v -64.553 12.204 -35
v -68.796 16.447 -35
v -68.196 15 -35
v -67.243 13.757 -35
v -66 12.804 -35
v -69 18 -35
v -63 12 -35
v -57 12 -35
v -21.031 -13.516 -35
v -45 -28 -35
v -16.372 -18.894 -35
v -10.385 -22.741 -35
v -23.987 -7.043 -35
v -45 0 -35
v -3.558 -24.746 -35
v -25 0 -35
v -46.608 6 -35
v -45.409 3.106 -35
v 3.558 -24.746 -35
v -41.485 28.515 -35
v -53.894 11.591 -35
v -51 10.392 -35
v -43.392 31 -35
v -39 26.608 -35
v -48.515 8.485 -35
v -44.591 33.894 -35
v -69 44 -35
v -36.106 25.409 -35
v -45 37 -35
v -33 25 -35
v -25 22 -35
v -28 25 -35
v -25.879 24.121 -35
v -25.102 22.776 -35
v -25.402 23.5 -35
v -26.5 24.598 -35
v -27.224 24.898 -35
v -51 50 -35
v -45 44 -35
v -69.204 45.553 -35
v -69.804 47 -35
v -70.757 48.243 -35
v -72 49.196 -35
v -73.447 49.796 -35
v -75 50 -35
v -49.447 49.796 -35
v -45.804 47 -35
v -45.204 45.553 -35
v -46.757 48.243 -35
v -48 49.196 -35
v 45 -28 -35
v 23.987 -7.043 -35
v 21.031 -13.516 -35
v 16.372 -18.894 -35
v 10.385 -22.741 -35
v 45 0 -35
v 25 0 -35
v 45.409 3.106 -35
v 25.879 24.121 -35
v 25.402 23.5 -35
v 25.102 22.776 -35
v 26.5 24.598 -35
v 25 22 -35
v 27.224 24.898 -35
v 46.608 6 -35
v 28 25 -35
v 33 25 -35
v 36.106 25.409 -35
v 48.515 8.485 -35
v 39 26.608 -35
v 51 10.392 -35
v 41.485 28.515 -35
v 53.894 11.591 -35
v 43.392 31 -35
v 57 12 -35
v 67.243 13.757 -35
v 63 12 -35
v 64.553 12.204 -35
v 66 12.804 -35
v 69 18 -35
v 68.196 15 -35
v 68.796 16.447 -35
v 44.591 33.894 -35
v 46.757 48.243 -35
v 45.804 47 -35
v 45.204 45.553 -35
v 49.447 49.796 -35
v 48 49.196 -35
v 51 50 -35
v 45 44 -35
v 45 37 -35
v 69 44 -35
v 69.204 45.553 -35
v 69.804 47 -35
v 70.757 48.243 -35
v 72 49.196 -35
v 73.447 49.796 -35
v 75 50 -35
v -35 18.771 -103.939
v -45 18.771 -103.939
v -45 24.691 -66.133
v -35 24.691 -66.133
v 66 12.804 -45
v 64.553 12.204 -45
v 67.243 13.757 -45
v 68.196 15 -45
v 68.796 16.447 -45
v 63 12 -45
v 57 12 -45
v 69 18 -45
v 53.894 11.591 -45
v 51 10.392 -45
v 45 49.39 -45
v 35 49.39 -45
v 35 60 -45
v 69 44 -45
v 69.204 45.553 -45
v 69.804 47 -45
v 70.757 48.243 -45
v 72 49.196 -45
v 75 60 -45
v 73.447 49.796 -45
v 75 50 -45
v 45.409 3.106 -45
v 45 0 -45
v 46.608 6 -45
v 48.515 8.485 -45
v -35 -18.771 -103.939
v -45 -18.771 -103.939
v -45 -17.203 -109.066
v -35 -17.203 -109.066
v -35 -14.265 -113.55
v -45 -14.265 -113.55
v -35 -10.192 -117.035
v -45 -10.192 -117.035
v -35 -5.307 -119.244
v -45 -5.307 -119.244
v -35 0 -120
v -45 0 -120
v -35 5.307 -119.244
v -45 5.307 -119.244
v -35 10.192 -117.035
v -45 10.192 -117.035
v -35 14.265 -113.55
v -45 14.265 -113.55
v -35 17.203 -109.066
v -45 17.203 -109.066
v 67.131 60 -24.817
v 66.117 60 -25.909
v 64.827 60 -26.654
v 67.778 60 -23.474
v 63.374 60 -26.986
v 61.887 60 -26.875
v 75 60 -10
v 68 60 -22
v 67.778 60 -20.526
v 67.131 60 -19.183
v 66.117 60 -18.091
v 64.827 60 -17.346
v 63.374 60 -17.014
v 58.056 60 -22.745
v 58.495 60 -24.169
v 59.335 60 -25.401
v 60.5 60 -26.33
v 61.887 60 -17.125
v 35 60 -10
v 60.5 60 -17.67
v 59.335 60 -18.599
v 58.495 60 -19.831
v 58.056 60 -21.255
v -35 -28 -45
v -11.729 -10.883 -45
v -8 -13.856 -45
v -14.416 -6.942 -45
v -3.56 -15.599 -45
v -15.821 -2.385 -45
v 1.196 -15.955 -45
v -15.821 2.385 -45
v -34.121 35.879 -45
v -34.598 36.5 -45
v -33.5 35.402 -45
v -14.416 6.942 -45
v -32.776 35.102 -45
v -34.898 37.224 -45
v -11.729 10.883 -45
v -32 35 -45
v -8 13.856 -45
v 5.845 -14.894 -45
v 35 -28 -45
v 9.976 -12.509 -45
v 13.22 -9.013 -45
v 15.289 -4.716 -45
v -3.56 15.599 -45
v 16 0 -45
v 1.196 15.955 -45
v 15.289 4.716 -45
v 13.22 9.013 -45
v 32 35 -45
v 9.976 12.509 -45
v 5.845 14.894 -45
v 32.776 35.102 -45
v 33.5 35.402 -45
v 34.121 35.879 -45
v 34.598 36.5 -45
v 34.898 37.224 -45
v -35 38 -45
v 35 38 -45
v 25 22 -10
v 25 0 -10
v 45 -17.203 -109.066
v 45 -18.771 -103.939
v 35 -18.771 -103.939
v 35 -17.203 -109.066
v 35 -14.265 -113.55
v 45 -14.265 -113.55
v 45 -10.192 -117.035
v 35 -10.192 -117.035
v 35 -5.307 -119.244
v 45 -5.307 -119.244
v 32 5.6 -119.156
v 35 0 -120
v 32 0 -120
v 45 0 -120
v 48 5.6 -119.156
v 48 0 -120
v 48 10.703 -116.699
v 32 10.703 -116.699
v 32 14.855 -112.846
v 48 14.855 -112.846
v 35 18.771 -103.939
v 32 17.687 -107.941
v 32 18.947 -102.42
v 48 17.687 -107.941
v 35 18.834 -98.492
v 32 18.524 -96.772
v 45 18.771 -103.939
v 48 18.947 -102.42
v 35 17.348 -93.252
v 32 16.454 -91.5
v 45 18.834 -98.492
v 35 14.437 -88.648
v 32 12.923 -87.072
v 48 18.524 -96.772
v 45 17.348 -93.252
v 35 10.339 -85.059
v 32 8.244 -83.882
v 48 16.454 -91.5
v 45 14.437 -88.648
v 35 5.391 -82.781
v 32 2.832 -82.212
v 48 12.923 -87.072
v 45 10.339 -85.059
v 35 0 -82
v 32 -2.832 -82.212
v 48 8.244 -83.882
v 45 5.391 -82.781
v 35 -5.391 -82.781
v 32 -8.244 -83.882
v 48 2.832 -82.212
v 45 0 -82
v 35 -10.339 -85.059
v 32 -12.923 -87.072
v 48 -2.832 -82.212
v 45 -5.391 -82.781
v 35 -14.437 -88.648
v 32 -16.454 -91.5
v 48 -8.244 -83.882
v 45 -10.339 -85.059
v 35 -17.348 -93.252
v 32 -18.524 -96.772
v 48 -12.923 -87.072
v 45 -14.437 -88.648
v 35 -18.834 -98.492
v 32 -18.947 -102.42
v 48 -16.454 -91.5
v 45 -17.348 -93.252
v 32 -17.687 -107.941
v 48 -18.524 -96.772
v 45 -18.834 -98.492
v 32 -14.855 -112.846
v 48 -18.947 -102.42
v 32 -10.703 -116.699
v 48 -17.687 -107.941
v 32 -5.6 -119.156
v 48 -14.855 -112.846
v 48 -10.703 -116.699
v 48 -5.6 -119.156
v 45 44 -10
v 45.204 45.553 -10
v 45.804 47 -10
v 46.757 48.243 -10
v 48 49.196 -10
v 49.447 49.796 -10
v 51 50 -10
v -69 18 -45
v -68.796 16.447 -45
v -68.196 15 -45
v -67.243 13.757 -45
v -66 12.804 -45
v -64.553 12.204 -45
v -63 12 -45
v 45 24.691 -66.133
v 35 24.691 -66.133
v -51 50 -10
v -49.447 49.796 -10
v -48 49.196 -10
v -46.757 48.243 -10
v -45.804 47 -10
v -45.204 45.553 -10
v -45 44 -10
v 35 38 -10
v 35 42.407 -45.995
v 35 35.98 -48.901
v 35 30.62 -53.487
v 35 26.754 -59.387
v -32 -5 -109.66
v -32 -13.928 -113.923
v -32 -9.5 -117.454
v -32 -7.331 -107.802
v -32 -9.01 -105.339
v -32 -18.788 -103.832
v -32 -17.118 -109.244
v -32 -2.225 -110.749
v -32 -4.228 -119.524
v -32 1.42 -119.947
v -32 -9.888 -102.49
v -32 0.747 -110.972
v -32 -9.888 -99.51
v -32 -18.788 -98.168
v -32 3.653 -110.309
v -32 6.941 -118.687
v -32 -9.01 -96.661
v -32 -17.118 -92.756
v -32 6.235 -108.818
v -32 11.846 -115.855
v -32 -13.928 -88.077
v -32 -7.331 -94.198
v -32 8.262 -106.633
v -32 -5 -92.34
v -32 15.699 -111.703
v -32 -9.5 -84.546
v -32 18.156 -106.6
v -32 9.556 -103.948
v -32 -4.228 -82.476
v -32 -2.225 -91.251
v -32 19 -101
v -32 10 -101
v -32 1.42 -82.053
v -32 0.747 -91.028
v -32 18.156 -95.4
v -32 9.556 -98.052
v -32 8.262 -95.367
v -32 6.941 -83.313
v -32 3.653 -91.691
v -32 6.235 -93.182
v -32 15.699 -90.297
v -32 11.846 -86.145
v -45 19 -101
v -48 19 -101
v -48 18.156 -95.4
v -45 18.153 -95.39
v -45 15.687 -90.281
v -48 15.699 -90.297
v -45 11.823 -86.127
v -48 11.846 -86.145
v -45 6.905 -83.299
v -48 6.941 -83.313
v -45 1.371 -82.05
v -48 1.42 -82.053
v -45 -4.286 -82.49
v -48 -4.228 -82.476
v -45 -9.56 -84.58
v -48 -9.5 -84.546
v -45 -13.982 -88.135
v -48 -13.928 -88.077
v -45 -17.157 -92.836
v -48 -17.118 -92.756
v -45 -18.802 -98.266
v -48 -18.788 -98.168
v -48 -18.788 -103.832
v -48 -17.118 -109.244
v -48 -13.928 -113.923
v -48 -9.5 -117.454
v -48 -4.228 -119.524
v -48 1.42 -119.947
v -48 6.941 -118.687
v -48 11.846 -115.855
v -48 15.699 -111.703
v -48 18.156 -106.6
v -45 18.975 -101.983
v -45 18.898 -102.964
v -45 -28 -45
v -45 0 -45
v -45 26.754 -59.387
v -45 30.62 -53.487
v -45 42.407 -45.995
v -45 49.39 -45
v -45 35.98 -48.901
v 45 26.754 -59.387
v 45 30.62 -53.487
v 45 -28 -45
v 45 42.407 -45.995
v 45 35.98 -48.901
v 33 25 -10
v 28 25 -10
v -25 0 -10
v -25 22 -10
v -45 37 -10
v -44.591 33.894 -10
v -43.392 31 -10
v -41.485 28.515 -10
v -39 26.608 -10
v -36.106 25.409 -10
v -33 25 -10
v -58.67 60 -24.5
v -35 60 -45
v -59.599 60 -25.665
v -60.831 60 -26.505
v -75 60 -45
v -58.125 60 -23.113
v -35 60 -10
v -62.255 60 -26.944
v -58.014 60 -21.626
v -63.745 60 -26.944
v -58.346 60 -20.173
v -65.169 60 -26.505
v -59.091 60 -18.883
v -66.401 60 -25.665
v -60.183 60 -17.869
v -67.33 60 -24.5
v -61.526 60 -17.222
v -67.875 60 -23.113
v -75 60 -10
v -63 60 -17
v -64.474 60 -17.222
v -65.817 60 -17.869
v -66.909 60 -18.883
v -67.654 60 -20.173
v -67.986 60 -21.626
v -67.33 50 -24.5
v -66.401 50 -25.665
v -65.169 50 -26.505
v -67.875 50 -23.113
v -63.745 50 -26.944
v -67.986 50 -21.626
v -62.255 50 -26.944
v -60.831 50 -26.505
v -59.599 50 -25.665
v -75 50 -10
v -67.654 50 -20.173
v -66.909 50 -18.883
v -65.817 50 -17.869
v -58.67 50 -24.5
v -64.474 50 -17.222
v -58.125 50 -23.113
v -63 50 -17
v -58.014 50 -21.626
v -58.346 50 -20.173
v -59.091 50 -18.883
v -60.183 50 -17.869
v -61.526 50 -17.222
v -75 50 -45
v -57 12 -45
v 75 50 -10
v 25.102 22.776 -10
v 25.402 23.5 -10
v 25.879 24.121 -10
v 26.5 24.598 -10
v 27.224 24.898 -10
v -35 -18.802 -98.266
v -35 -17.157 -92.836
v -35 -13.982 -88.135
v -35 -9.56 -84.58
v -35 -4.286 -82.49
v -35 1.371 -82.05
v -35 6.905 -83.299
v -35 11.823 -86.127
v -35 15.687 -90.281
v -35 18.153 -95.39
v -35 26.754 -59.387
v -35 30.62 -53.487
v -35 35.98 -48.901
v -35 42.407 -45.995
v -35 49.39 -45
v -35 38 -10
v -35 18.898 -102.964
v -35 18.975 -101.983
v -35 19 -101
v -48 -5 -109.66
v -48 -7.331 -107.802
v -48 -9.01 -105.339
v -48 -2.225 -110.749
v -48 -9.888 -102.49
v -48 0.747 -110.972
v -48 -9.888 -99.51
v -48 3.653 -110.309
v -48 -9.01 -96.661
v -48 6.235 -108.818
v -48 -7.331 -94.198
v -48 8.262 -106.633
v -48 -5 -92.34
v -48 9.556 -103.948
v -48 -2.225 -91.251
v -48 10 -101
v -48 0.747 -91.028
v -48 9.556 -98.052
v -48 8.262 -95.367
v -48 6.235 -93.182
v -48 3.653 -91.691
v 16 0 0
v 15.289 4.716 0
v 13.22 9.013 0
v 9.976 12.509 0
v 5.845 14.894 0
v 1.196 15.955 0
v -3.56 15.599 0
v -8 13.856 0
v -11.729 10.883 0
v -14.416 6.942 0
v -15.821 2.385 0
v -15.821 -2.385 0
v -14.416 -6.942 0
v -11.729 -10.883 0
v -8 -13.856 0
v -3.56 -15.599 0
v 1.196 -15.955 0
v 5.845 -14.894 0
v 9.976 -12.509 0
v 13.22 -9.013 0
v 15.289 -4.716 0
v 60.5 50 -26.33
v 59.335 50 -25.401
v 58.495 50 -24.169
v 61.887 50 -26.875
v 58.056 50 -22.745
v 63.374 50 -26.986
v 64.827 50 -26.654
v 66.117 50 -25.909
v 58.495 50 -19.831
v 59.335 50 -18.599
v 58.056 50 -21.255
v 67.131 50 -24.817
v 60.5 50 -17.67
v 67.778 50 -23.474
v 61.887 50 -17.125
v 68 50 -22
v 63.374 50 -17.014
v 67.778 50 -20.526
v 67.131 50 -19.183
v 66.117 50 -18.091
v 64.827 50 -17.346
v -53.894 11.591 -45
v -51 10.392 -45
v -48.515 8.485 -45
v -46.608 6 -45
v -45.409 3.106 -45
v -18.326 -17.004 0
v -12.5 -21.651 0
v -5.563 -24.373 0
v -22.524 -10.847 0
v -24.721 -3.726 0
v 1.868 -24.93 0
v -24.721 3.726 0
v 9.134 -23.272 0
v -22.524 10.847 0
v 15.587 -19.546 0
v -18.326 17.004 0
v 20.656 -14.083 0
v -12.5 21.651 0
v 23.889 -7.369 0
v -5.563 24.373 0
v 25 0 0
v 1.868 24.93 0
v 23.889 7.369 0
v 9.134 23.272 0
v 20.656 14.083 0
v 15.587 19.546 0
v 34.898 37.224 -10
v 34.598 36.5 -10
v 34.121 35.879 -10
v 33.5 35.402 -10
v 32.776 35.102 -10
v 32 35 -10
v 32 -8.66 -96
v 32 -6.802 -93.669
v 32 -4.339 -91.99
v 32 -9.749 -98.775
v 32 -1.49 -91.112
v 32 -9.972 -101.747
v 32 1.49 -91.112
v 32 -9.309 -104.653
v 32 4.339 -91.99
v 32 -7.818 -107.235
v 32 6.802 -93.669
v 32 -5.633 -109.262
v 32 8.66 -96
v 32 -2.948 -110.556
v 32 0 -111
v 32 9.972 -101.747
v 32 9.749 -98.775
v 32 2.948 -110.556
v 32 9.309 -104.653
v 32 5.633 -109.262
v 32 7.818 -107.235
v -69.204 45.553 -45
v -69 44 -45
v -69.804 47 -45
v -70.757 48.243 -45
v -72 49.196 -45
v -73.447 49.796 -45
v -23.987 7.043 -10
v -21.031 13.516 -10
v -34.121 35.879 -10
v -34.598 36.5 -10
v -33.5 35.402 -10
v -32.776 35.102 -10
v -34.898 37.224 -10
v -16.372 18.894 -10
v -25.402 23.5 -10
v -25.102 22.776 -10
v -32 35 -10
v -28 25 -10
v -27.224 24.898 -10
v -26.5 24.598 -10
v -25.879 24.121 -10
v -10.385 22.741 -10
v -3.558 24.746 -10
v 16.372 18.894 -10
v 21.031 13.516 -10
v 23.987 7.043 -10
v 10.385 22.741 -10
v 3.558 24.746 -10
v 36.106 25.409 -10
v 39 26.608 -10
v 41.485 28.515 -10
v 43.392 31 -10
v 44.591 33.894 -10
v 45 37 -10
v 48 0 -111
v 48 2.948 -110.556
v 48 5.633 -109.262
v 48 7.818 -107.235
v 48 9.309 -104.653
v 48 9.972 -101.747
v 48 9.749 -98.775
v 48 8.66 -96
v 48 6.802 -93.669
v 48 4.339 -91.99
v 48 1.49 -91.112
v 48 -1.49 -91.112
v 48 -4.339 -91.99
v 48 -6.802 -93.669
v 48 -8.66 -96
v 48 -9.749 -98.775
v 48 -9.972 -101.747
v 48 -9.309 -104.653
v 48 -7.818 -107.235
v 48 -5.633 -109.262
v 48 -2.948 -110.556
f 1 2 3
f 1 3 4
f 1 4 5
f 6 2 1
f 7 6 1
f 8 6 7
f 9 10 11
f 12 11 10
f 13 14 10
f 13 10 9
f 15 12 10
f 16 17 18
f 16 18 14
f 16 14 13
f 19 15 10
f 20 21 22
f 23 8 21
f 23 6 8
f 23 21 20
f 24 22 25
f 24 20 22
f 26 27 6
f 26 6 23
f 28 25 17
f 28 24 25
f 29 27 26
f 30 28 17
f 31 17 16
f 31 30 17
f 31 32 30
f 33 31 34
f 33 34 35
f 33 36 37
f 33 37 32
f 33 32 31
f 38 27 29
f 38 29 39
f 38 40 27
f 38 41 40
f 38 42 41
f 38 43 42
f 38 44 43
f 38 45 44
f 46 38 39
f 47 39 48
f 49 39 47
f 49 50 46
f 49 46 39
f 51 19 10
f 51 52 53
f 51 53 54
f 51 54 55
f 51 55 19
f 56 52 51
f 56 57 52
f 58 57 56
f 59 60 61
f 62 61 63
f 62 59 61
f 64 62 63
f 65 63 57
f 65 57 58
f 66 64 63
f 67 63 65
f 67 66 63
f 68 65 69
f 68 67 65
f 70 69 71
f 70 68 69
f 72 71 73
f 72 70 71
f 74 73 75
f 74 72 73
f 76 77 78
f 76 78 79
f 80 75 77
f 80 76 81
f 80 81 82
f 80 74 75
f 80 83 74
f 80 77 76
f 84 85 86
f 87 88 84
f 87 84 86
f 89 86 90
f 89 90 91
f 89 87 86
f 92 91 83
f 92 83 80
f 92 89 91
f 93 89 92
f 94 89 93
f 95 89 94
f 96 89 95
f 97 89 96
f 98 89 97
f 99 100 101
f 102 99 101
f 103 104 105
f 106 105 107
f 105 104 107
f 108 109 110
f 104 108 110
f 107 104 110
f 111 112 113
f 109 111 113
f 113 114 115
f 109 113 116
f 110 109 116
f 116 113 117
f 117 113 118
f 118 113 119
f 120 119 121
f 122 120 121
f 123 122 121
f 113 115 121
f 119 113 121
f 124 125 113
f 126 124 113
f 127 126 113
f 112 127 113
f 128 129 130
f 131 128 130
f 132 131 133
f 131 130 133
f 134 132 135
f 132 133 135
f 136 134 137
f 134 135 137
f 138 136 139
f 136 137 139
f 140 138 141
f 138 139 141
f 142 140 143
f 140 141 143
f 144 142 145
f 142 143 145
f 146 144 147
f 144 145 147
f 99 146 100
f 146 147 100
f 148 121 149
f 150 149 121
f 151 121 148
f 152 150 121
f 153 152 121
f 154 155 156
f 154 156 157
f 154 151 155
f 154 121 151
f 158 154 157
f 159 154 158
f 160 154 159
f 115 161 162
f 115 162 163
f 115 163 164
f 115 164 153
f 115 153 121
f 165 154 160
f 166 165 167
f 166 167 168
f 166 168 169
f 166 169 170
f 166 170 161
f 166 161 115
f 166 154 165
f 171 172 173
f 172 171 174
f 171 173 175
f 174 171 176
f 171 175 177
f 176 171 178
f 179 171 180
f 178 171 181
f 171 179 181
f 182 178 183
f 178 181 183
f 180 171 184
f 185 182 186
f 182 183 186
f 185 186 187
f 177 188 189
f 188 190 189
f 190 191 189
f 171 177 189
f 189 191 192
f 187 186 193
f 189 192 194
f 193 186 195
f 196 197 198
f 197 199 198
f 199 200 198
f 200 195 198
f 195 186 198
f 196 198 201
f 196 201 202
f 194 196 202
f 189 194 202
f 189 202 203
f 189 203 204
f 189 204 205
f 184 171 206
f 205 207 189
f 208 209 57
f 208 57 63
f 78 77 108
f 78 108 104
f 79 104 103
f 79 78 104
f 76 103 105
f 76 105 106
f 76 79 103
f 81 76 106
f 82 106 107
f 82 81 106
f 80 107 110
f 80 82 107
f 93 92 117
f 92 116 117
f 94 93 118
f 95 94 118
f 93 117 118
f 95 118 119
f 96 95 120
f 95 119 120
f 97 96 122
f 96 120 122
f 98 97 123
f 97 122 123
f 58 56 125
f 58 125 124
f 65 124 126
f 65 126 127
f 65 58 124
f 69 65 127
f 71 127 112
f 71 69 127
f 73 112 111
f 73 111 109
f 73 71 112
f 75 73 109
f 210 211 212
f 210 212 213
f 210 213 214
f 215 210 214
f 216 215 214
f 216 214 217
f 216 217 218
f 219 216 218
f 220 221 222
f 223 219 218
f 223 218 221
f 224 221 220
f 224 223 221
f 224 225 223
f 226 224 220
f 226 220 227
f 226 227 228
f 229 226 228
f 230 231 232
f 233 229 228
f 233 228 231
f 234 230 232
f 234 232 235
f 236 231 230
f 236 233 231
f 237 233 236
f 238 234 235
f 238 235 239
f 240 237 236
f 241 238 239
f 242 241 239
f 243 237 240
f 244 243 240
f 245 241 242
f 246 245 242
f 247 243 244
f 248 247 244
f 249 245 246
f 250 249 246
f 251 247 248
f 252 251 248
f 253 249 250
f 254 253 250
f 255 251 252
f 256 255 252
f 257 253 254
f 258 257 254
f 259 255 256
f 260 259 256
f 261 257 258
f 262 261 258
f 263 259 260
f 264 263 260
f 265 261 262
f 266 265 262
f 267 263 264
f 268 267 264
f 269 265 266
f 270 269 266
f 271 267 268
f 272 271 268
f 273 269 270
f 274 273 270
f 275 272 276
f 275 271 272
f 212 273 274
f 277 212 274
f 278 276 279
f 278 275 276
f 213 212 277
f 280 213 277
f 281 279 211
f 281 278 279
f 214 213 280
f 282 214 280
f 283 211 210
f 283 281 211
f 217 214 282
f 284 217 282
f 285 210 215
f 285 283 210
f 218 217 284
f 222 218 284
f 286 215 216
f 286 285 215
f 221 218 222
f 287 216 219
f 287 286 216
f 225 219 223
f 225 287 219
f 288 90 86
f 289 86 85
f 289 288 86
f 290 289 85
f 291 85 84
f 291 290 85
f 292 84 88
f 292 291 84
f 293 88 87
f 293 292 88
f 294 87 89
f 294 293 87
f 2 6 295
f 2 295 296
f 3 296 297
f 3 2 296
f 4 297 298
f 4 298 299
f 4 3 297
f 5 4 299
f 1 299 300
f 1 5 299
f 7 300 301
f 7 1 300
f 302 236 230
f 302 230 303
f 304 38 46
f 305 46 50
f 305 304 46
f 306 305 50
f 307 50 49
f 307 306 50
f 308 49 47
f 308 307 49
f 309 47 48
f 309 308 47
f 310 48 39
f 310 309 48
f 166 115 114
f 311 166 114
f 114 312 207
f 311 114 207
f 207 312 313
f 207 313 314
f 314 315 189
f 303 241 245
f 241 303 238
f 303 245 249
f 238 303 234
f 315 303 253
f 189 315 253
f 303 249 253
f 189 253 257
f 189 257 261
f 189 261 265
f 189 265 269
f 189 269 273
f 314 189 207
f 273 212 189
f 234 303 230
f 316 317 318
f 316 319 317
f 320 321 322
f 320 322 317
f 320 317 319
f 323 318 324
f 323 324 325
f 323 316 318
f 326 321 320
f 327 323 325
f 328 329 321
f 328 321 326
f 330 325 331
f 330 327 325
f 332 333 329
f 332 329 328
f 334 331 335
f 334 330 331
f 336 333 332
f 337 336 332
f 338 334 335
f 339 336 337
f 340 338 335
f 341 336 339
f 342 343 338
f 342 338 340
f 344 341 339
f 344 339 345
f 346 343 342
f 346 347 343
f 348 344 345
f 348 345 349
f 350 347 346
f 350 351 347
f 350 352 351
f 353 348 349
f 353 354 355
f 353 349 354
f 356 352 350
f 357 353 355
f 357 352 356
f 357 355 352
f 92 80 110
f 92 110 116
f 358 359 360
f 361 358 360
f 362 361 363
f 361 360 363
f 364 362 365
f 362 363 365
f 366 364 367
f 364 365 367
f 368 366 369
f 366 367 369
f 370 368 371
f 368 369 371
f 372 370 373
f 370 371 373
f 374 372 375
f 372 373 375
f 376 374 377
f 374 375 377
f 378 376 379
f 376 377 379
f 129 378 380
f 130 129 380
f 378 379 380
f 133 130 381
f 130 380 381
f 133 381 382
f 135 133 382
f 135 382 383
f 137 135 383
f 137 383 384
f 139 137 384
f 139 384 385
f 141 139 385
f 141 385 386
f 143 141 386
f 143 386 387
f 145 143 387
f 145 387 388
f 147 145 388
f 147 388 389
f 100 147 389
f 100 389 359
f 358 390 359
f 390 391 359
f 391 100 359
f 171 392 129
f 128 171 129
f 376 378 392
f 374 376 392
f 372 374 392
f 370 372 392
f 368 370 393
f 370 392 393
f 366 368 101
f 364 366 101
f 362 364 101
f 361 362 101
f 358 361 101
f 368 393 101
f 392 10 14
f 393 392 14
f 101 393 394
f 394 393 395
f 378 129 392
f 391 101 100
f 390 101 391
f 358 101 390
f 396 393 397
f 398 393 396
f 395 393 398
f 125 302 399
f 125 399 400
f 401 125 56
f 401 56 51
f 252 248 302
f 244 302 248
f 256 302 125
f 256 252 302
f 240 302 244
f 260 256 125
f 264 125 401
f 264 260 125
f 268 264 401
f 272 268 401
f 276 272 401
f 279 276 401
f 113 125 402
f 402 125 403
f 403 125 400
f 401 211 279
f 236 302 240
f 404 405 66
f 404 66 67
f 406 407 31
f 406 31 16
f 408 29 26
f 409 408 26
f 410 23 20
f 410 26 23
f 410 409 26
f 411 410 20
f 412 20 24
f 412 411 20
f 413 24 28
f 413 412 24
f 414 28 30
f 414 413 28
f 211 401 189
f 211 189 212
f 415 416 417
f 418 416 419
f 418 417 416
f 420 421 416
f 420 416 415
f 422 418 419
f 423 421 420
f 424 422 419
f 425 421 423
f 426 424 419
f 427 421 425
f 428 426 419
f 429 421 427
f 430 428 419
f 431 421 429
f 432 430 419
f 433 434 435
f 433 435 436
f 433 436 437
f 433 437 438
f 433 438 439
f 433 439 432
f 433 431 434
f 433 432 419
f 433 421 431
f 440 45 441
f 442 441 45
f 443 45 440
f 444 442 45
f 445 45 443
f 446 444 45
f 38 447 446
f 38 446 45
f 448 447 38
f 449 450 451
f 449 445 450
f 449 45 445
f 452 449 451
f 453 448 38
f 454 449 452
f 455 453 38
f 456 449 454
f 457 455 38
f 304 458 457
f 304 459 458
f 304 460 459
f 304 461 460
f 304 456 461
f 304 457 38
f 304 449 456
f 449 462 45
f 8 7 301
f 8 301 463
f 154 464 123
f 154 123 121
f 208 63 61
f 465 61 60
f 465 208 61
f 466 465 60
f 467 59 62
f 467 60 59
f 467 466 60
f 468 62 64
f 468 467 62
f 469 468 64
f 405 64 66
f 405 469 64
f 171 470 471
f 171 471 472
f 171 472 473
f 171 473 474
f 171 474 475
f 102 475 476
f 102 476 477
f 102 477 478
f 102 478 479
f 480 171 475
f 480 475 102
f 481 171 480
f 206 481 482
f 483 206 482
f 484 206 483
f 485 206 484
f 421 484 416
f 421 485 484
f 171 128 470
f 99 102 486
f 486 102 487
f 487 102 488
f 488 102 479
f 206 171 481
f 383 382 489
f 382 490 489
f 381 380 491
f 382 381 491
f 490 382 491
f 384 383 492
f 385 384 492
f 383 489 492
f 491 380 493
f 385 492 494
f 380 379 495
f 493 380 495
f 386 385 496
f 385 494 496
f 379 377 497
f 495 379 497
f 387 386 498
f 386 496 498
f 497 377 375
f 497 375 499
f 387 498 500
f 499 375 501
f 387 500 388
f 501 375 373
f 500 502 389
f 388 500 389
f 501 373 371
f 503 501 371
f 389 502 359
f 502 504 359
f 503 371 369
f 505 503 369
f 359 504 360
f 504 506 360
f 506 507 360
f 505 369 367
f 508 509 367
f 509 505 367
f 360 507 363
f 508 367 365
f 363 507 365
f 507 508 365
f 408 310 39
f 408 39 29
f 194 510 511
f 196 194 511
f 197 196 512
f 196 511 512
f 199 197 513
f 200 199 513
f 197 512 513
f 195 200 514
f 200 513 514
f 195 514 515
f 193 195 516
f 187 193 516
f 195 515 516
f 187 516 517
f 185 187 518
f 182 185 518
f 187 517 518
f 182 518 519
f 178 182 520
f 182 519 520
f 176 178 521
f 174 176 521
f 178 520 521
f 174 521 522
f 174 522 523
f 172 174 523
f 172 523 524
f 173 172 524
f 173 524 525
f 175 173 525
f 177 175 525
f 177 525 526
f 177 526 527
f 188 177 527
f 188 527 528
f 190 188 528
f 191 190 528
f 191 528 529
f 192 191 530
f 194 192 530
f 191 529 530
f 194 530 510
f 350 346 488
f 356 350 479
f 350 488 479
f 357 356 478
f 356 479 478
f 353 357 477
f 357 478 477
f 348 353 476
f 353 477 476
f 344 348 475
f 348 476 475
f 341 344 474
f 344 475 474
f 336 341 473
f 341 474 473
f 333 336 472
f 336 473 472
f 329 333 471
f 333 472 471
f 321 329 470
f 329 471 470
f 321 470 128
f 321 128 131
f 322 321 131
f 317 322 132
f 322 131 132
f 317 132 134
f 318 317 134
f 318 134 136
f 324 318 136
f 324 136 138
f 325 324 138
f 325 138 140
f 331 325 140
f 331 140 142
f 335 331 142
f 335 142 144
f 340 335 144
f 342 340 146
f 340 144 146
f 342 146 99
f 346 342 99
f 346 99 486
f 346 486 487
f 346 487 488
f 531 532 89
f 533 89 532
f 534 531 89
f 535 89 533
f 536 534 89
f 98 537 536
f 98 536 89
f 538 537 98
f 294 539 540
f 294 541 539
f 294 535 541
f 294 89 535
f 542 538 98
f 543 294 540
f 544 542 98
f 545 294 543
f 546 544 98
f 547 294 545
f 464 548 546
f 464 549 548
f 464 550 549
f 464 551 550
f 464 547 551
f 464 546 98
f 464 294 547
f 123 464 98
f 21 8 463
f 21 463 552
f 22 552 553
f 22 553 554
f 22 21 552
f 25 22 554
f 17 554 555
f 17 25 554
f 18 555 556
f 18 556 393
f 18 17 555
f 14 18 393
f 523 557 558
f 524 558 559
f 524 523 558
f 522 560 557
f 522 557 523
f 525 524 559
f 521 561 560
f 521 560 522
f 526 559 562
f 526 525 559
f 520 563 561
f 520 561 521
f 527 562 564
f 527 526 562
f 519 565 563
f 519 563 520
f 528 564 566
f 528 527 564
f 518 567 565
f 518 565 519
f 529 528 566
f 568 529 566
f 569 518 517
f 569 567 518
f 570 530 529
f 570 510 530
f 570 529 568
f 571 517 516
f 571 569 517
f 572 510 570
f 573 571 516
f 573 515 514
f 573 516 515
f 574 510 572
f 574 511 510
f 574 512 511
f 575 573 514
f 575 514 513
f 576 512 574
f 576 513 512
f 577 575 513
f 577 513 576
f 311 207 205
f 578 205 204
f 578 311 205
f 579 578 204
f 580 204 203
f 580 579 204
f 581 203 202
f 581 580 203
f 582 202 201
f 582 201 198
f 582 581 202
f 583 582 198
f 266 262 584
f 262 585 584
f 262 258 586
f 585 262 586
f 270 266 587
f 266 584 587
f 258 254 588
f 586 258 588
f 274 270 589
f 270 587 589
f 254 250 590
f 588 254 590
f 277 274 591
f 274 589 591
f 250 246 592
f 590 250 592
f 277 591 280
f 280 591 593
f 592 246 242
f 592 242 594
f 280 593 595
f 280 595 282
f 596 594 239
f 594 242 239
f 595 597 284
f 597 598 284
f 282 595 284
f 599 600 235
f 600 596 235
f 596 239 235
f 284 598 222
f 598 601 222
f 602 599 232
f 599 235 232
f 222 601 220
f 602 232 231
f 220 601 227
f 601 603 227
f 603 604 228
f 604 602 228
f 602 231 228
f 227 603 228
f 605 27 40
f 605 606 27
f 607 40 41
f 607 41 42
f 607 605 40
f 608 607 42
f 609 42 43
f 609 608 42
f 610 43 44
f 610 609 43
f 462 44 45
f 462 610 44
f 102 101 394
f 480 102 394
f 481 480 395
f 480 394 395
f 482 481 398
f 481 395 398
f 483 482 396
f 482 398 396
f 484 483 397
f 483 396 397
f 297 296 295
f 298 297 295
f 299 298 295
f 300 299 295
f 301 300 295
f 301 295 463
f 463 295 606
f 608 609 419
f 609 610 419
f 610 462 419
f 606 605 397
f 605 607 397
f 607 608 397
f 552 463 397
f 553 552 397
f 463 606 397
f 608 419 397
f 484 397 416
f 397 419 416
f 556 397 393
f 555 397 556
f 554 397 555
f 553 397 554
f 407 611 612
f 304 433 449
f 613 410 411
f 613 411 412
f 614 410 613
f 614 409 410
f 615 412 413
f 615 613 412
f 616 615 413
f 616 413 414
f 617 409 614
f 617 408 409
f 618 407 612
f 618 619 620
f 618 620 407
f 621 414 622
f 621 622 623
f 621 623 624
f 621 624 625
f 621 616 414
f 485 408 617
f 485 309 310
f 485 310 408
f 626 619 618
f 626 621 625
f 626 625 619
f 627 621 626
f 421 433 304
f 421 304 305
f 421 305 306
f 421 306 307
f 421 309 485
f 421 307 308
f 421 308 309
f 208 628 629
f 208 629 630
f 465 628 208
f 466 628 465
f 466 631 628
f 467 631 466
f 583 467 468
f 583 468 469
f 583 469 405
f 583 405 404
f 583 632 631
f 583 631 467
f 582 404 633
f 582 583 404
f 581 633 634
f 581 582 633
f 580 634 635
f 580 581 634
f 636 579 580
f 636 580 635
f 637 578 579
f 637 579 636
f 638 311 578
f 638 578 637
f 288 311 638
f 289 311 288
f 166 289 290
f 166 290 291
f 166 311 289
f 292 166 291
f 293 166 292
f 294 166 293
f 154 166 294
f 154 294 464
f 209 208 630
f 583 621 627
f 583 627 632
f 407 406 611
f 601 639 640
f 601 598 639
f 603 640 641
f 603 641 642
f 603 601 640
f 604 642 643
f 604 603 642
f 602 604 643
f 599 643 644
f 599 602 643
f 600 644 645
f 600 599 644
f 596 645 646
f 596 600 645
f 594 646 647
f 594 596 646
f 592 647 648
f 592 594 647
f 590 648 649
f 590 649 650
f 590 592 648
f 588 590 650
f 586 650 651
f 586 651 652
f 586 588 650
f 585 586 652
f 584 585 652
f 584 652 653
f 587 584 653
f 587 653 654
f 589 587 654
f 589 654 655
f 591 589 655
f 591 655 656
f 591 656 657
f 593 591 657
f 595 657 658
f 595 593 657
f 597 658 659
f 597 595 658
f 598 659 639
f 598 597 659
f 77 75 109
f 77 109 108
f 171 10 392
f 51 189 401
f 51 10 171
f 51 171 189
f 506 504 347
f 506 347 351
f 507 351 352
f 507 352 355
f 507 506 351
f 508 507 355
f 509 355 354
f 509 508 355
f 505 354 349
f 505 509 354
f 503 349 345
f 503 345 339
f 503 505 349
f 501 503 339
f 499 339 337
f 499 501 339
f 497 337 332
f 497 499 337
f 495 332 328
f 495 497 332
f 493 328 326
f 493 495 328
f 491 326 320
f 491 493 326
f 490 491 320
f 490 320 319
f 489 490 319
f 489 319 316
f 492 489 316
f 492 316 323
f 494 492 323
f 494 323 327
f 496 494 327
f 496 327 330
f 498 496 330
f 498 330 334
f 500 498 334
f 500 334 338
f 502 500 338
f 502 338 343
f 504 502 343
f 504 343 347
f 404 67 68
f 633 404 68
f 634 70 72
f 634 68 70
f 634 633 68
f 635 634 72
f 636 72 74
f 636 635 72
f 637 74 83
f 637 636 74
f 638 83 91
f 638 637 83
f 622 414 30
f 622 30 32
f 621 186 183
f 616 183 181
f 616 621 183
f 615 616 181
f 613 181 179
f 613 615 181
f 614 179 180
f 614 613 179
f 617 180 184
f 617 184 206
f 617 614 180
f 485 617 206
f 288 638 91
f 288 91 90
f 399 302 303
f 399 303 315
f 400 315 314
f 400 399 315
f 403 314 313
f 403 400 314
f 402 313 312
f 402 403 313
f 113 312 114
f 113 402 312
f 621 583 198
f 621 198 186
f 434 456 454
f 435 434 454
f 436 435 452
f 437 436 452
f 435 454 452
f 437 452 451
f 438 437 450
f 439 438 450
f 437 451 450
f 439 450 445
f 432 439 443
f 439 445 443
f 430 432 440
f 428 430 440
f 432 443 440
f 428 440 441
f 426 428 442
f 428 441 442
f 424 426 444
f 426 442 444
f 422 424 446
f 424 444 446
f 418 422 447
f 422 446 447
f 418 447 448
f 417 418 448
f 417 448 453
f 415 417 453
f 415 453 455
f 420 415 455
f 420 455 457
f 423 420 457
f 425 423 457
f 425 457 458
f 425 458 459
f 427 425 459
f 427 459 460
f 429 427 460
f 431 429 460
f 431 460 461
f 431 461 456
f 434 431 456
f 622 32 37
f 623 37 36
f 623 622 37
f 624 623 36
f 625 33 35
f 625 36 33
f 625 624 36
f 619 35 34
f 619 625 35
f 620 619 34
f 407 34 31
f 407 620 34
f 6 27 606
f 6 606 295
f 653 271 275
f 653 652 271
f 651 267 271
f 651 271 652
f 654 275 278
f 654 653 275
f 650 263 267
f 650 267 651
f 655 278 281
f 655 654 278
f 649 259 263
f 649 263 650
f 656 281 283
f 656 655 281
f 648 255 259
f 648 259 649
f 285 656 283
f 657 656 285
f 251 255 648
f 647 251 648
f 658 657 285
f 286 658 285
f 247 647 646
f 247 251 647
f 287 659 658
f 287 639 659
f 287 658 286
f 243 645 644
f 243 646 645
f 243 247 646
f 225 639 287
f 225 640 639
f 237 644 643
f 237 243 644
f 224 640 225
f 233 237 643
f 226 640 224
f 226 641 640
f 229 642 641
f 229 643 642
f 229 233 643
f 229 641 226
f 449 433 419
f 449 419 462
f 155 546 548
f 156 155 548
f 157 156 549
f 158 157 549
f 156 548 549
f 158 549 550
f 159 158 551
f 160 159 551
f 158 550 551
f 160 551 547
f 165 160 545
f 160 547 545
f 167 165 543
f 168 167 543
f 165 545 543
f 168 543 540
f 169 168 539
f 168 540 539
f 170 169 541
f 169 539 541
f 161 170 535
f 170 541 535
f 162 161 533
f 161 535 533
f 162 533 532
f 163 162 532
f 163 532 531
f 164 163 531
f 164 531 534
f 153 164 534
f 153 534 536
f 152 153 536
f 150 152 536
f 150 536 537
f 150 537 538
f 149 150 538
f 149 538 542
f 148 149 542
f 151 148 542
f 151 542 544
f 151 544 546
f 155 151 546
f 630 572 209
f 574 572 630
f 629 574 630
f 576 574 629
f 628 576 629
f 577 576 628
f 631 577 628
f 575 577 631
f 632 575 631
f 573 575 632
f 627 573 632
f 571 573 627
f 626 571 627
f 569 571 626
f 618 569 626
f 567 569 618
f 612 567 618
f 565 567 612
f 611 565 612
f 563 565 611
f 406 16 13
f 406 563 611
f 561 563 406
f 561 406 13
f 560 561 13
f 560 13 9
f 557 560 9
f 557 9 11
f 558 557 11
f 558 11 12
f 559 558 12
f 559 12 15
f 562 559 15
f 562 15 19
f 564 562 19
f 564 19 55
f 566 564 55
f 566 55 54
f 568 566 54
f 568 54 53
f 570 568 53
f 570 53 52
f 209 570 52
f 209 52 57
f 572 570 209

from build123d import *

# Parameters (mm, degrees)
IZIM1_R                     = 25
IZIM1_R_2                   = 16
Y_KSEKLIK_EKSTR_ZYON1_DEPTH = 45
Y_KSEKLIK_EKSTR_ZYON2_DEPTH = 35
Y_KSEKLIK_EKSTR_ZYON4_START = -10
Y_KSEKLIK_EKSTR_ZYON4_DEPTH = 10
RADYUS2_R                   = 6
IZIM6_R                     = 10
Y_KSEKLIK_EKSTR_ZYON6_DEPTH = 10
IZIM7_R                     = 19
IZIM7_R_2                   = 10
Y_KSEKLIK_EKSTR_ZYON7_DEPTH = 8
RADYUS3_R                   = 25
AYNALAMA1_START             = -45
AYNALAMA1_OUTLINE_R         = 10
AYNALAMA1_DEPTH             = 10
AYNALAMA1_START_2           = -48
AYNALAMA1_2_OUTLINE_R       = 19
AYNALAMA1_2_OUTLINE_R_2     = 10
AYNALAMA1_2_DEPTH           = 16
IZIM8_R                     = 5
KES_EKSTR_ZYON1_DEPTH       = 16


# Read off the part's stored shape, not the designer's step: Aynalama1
# Some blends are built 0.0001 mm under size
with BuildPart() as part:
    # Çizim1 → Yükseklik-Ekstrüzyon1 (new body)
    with BuildSketch(Plane.XY):
        Circle(IZIM1_R)
        Circle(IZIM1_R_2, mode=Mode.SUBTRACT)
    extrude(amount=-Y_KSEKLIK_EKSTR_ZYON1_DEPTH)

    # Çizim4 → Yükseklik-Ekstrüzyon2 (add)
    with BuildSketch(Plane.XY.offset(-10)):
        with BuildLine():
            Line((25, 0), (25, 22))
            ThreePointArc((25, 22), (25.878679656, 24.121320344), (28, 25))
            Line((28, 25), (33, 25))
            ThreePointArc((33, 25), (41.485281374, 28.514718626), (45, 37))
            Line((45, 37), (45, 44))
            ThreePointArc((45, 44), (46.757359313, 48.242640687), (51, 50))
            Line((51, 50), (75, 50))
            Line((75, 50), (75, 60))
            Line((75, 60), (35, 60))
            Line((35, 60), (35, 38))
            ThreePointArc((35, 38), (34.121320344, 35.878679656), (32, 35))
            Line((32, 35), (-32, 35))
            ThreePointArc((-32, 35), (-34.121320344, 35.878679656), (-35, 38))
            Line((-35, 38), (-35, 60))
            Line((-35, 60), (-75, 60))
            Line((-75, 60), (-75, 50))
            Line((-75, 50), (-51, 50))
            ThreePointArc((-51, 50), (-46.757359313, 48.242640687), (-45, 44))
            Line((-45, 44), (-45, 37))
            ThreePointArc((-45, 37), (-41.485281374, 28.514718626), (-33, 25))
            Line((-33, 25), (-28, 25))
            ThreePointArc((-28, 25), (-25.878679656, 24.121320344), (-25, 22))
            Line((-25, 22), (-25, 0))
            ThreePointArc((-25, 0), (0, 25), (25, 0))
        make_face()
    extrude(amount=-Y_KSEKLIK_EKSTR_ZYON2_DEPTH)

    # Çizim5 → Yükseklik-Ekstrüzyon4 (add)
    with BuildSketch(Plane(origin=(0, 0, -45), x_dir=(-1, 0, 0), z_dir=(0, 0, -1)).offset(Y_KSEKLIK_EKSTR_ZYON4_START)):
        with BuildLine():
            Line((69, 50), (69, 18))
            ThreePointArc((69, 18), (67.242640687, 13.757359313), (63, 12))
            Line((63, 12), (57, 12))
            ThreePointArc((57, 12), (48.514718626, 8.485281374), (45, 0))
            Line((45, 0), (45, -28))
            Line((45, -28), (-45, -28))
            Line((-45, -28), (-45, 0))
            ThreePointArc((-45, 0), (-48.514718626, 8.485281374), (-57, 12))
            Line((-57, 12), (-63, 12))
            ThreePointArc((-63, 12), (-67.242640687, 13.757359313), (-69, 18))
            Line((-69, 18), (-69, 50))
            Line((-69, 50), (-51, 50))
            ThreePointArc((-51, 50), (-46.757359313, 48.242640687), (-45, 44))
            Line((-45, 44), (-45, 37))
            ThreePointArc((-45, 37), (-41.485281374, 28.514718626), (-33, 25))
            Line((-33, 25), (-28, 25))
            ThreePointArc((-28, 25), (-25.878679656, 24.121320344), (-25, 22))
            Line((-25, 22), (-25, 0))
            ThreePointArc((-25, 0), (0, -25), (25, 0))
            Line((25, 0), (25, 22))
            ThreePointArc((25, 22), (25.878679656, 24.121320344), (28, 25))
            Line((28, 25), (33, 25))
            ThreePointArc((33, 25), (41.485281374, 28.514718626), (45, 37))
            Line((45, 37), (45, 44))
            ThreePointArc((45, 44), (46.757359313, 48.242640687), (51, 50))
            Line((51, 50), (69, 50))
        make_face()
    extrude(amount=Y_KSEKLIK_EKSTR_ZYON4_DEPTH)

    # Radyus2
    radyus2_edges = [part.edges().sort_by_distance(p)[0] for p in [
        (-69, 50, -40),
        (69, 50, -40),
    ]]
    fillet(radyus2_edges, radius=RADYUS2_R - 0.0001)  # a hair under: the kernel refuses the full size

    # Çizim6 → Yükseklik-Ekstrüzyon6 (add)
    with BuildSketch(Plane(origin=(45, 0, 0), x_dir=(0, 0, -1), z_dir=(1, 0, 0))):
        with BuildLine():
            Line((45, -28), (103.939212458, -18.771282059))
            ThreePointArc((103.939212458, -18.771282059), (120, 0), (103.939212458, 18.771282059))
            Line((103.939212458, 18.771282059), (45, 28))
            Line((45, 28), (45, -28))
        make_face()
        with Locations((101, 0)):
            Circle(IZIM6_R, mode=Mode.SUBTRACT)
    extrude(amount=-Y_KSEKLIK_EKSTR_ZYON6_DEPTH)

    # Çizim7 → Yükseklik-Ekstrüzyon7 (add, symmetric)
    with BuildSketch(Plane(origin=(40, 0, 0), x_dir=(0, 0, -1), z_dir=(1, 0, 0))):
        with Locations((101, 0)):
            Circle(IZIM7_R)
        with Locations((101, 0)):
            Circle(IZIM7_R_2, mode=Mode.SUBTRACT)
    extrude(amount=Y_KSEKLIK_EKSTR_ZYON7_DEPTH, both=True)

    # Radyus3
    # the kernel refuses this fillet: 25 mm, written as the material it adds along each edge
    with BuildSketch(Plane(origin=(45, 28, -45), x_dir=(0, 1, 0), z_dir=(-1, 0, 0))) as radyus3_piece_1:
        with BuildLine():
            CenterArc((RADYUS3_R * 0.855604187922, RADYUS3_R), RADYUS3_R, 188.899130451, 81.100869549)
            Line((-RADYUS3_R * 0.132358025694, RADYUS3_R * 0.845304607478), (0, 0))
            Line((0, 0), (RADYUS3_R * 0.855604187922, 0))
        make_face()
    extrude(amount=10)

    # Aynalama1 outline → Aynalama1 (add)
    with BuildSketch(Plane.YZ.offset(AYNALAMA1_START)):
        with BuildLine():
            ThreePointArc((-18.771282059, -103.939212458), (0, -120), (18.771282059, -103.939212458))
            Line((18.771282059, -103.939212458), (24.691049358, -66.132615187))
            ThreePointArc((24.691049358, -66.132615187), (33.137176044, -51.004150186), (49.390104698, -45))
            Line((49.390104698, -45), (-28, -45))
            Line((-28, -45), (-18.771282059, -103.939212458))
        make_face()
        with Locations((0, -101)):
            Circle(AYNALAMA1_OUTLINE_R, mode=Mode.SUBTRACT)
    extrude(amount=AYNALAMA1_DEPTH)

    # Aynalama1 2 outline → Aynalama1 2 (add)
    with BuildSketch(Plane.YZ.offset(AYNALAMA1_START_2)):
        with Locations((0, -101)):
            Circle(AYNALAMA1_2_OUTLINE_R)
        with Locations((0, -101)):
            Circle(AYNALAMA1_2_OUTLINE_R_2, mode=Mode.SUBTRACT)
    extrude(amount=AYNALAMA1_2_DEPTH)

    # Çizim8 → Kes-Ekstrüzyon1 (cut)
    with BuildSketch(Plane.XZ.offset(-50)):
        with Locations((63, -22)):
            Circle(IZIM8_R)
        with Locations(Location((-63, -22, 0), (0, 0, 90))):
            Circle(IZIM8_R)
    extrude(amount=-KES_EKSTR_ZYON1_DEPTH, mode=Mode.SUBTRACT)


solid = part.part
